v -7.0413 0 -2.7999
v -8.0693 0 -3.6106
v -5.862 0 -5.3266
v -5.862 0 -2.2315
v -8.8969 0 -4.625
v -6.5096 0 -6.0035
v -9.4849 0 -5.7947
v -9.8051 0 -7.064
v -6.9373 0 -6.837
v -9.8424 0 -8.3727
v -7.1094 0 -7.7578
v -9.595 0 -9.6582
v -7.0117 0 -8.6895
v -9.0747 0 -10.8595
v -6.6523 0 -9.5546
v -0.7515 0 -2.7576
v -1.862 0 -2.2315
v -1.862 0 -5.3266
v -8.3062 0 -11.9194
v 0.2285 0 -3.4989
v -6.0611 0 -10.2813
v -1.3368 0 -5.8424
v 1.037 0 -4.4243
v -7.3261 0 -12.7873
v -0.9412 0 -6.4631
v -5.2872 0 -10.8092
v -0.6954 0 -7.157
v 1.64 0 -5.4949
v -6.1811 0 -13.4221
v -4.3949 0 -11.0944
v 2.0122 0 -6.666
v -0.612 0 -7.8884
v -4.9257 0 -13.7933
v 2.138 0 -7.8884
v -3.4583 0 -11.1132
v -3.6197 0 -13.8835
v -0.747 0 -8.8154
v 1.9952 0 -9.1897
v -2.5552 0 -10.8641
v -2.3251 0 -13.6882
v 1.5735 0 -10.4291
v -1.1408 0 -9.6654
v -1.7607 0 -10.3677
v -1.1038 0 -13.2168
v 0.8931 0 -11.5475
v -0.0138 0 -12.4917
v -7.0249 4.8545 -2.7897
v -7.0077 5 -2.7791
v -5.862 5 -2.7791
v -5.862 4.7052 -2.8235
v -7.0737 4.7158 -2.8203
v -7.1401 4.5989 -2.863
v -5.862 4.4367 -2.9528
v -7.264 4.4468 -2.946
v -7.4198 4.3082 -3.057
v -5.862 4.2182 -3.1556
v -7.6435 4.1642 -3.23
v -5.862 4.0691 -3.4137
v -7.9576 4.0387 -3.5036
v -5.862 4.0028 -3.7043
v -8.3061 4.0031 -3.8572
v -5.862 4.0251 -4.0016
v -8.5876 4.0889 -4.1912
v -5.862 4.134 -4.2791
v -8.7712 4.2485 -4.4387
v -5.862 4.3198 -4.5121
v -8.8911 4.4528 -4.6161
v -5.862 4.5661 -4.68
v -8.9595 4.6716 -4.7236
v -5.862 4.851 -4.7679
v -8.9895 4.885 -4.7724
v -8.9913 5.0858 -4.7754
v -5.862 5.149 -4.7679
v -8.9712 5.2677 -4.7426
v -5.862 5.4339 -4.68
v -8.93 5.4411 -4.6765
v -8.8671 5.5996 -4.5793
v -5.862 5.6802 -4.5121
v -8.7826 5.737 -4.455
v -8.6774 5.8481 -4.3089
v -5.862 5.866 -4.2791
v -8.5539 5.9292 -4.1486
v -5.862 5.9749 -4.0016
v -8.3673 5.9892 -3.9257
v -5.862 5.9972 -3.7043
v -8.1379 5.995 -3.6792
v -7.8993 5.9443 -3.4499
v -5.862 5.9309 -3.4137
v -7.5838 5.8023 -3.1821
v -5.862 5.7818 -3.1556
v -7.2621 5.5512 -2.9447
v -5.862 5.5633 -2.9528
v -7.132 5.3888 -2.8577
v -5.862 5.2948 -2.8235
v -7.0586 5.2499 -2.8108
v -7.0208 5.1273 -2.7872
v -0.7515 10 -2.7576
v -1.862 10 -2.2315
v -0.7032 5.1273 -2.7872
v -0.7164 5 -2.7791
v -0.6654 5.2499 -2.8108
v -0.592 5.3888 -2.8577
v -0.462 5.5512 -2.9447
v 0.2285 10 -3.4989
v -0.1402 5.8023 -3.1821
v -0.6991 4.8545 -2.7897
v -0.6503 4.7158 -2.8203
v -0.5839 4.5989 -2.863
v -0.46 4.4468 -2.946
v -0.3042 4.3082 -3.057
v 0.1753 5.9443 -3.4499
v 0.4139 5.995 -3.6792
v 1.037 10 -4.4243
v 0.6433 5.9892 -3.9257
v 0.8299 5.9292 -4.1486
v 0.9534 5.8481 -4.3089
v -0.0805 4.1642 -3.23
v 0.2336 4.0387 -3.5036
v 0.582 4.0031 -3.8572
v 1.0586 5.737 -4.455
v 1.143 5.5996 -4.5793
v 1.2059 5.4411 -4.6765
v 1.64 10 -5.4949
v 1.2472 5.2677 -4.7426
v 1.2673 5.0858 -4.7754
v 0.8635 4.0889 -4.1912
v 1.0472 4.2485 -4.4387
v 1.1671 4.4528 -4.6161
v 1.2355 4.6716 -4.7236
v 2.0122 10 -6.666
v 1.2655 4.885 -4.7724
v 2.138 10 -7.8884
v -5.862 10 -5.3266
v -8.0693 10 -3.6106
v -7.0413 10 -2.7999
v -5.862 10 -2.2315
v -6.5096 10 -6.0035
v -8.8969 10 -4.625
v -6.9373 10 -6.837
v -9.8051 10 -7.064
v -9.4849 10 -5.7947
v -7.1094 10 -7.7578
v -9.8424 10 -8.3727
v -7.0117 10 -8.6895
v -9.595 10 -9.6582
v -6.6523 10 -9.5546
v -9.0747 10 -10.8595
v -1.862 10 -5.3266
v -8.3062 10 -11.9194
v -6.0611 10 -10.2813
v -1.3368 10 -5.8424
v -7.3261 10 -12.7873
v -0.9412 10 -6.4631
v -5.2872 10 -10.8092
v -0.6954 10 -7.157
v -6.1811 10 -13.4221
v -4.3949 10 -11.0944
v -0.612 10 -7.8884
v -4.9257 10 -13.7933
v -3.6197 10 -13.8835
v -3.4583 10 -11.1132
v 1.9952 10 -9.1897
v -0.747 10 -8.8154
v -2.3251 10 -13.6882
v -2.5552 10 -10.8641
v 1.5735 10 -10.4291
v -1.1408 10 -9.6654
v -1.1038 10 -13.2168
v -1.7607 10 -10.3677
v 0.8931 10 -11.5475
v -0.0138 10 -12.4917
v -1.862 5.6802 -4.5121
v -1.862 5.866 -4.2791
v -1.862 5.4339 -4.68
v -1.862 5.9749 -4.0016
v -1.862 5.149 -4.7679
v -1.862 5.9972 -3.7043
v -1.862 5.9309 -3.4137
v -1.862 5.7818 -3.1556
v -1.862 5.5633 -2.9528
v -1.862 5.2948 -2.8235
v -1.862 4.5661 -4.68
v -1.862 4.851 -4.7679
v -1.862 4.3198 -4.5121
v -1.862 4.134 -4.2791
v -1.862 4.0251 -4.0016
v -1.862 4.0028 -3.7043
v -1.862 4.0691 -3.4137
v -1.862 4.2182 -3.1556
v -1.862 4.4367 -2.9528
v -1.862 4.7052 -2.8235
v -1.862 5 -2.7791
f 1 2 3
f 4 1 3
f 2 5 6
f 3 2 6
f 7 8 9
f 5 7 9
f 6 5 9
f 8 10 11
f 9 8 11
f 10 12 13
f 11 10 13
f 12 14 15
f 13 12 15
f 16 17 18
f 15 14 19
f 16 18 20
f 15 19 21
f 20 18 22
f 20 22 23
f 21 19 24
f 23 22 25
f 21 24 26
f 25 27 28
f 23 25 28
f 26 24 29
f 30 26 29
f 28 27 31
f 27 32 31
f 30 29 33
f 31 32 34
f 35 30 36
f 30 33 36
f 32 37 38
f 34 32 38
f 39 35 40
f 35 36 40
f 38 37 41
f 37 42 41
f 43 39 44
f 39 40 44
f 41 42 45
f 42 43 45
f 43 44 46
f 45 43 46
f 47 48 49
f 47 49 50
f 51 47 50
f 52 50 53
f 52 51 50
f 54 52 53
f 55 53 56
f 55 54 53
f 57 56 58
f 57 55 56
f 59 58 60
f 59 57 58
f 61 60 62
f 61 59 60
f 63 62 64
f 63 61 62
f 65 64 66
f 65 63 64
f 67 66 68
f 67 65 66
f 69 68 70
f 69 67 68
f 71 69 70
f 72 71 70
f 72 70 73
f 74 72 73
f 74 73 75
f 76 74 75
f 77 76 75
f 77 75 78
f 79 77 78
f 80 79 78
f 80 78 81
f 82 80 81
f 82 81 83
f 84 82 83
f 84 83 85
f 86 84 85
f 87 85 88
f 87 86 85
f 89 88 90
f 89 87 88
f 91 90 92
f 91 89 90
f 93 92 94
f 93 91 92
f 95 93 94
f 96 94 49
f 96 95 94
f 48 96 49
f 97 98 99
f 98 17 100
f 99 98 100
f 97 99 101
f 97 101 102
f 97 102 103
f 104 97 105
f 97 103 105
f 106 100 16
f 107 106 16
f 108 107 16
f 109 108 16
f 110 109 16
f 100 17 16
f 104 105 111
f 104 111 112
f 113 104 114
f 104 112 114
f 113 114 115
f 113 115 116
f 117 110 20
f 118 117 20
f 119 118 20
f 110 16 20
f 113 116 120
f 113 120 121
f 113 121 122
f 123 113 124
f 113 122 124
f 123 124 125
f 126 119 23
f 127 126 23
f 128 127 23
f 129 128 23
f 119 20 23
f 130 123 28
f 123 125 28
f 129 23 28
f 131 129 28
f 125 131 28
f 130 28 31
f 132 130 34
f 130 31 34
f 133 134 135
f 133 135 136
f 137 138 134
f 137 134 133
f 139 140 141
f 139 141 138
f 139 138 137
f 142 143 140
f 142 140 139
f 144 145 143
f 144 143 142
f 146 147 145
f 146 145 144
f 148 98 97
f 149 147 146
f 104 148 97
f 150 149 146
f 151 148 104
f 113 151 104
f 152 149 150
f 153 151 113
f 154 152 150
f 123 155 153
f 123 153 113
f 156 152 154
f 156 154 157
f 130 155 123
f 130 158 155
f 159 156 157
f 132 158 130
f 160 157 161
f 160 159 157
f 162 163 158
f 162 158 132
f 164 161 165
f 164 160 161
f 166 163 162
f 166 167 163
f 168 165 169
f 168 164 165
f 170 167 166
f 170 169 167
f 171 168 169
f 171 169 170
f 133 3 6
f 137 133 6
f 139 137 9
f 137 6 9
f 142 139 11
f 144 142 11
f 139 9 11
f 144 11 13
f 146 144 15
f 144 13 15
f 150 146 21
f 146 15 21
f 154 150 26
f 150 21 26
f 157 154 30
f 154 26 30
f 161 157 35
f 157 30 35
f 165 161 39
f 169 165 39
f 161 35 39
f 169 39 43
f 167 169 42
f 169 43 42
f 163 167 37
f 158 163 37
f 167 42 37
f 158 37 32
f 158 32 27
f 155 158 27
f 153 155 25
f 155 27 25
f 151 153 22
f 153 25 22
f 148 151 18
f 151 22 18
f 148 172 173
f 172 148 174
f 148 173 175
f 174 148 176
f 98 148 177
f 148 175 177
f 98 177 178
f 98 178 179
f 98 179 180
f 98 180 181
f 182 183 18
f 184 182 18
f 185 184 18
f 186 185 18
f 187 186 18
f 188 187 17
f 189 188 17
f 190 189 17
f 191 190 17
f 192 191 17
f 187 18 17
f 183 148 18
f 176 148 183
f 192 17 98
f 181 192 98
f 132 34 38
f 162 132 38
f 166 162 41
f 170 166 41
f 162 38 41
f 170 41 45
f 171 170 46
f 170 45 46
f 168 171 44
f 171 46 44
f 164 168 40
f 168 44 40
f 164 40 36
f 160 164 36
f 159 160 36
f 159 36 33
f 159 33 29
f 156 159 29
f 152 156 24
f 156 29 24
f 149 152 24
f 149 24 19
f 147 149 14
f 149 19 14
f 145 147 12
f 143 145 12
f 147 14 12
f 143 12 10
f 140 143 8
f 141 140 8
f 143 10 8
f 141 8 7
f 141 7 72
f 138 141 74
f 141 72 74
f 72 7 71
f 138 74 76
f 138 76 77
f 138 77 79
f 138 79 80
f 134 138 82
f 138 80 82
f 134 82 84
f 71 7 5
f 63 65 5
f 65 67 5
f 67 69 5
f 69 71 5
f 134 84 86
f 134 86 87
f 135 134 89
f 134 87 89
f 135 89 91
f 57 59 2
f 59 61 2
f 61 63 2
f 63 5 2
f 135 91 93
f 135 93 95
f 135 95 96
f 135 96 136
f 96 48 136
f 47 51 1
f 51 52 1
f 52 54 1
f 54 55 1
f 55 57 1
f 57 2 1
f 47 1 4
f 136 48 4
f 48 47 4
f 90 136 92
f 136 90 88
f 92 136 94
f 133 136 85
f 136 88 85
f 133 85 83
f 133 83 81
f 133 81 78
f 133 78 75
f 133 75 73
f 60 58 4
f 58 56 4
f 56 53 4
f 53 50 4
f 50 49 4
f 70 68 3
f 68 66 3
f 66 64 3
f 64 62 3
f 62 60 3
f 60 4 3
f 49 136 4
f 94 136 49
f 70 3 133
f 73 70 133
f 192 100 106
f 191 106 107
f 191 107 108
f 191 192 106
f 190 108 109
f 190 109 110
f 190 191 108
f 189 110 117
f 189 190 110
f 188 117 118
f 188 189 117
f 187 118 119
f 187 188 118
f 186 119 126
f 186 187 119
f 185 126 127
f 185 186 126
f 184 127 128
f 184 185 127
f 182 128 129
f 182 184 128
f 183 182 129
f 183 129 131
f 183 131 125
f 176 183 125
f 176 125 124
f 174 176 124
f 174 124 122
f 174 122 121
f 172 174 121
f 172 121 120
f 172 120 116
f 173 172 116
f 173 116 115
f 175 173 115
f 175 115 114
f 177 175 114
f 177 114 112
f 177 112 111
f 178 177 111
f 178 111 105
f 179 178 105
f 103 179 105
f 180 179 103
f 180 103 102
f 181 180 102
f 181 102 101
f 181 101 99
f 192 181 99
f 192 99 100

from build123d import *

# Parameters (mm, degrees)
BOSS_EXTRUDE1_DEPTH     = 10
CUT_EXTRUDE1_DEPTH      = 10
CUT_EXTRUDE1_DEPTH_BACK = 10
SKETCH2_R               = 1


with BuildPart() as part:
    # Sketch1 → Boss-Extrude1 (new body)
    with BuildSketch(Plane(origin=(0, 0, 0), x_dir=(1, 0, 0), z_dir=(0, 1, 0))):
        with BuildLine():
            Line((-5.862008202, 2.231502929), (-5.862008202, 5.326619487))
            ThreePointArc((-5.862008202, 5.326619487), (-5.287227483, 10.80918754), (-0.612008202, 7.888357178))
            ThreePointArc((-0.612008202, 7.888357178), (-0.941177841, 6.463137897), (-1.862008202, 5.326619487))
            Line((-1.862008202, 5.326619487), (-1.862008202, 2.231502929))
            ThreePointArc((-1.862008202, 2.231502929), (1.036971284, 4.424255563), (2.137991798, 7.888357178))
            ThreePointArc((2.137991798, 7.888357178), (-7.326109817, 12.787336664), (-5.862008202, 2.231502929))
        make_face()
    extrude(amount=BOSS_EXTRUDE1_DEPTH)

    # Sketch2 → Cut-Extrude1 (cut, two sides: drawn at the far end of the back side and taken through both)
    with BuildSketch(Plane(origin=(-5.862008202, 0, 0), x_dir=(0, 0, -1), z_dir=(1, 0, 0)).offset(-CUT_EXTRUDE1_DEPTH_BACK)):
        with Locations(Location((3.779061208, 5, 0), (0, 0, 180))):
            Circle(SKETCH2_R)
    extrude(amount=CUT_EXTRUDE1_DEPTH + CUT_EXTRUDE1_DEPTH_BACK, mode=Mode.SUBTRACT)


solid = part.part
